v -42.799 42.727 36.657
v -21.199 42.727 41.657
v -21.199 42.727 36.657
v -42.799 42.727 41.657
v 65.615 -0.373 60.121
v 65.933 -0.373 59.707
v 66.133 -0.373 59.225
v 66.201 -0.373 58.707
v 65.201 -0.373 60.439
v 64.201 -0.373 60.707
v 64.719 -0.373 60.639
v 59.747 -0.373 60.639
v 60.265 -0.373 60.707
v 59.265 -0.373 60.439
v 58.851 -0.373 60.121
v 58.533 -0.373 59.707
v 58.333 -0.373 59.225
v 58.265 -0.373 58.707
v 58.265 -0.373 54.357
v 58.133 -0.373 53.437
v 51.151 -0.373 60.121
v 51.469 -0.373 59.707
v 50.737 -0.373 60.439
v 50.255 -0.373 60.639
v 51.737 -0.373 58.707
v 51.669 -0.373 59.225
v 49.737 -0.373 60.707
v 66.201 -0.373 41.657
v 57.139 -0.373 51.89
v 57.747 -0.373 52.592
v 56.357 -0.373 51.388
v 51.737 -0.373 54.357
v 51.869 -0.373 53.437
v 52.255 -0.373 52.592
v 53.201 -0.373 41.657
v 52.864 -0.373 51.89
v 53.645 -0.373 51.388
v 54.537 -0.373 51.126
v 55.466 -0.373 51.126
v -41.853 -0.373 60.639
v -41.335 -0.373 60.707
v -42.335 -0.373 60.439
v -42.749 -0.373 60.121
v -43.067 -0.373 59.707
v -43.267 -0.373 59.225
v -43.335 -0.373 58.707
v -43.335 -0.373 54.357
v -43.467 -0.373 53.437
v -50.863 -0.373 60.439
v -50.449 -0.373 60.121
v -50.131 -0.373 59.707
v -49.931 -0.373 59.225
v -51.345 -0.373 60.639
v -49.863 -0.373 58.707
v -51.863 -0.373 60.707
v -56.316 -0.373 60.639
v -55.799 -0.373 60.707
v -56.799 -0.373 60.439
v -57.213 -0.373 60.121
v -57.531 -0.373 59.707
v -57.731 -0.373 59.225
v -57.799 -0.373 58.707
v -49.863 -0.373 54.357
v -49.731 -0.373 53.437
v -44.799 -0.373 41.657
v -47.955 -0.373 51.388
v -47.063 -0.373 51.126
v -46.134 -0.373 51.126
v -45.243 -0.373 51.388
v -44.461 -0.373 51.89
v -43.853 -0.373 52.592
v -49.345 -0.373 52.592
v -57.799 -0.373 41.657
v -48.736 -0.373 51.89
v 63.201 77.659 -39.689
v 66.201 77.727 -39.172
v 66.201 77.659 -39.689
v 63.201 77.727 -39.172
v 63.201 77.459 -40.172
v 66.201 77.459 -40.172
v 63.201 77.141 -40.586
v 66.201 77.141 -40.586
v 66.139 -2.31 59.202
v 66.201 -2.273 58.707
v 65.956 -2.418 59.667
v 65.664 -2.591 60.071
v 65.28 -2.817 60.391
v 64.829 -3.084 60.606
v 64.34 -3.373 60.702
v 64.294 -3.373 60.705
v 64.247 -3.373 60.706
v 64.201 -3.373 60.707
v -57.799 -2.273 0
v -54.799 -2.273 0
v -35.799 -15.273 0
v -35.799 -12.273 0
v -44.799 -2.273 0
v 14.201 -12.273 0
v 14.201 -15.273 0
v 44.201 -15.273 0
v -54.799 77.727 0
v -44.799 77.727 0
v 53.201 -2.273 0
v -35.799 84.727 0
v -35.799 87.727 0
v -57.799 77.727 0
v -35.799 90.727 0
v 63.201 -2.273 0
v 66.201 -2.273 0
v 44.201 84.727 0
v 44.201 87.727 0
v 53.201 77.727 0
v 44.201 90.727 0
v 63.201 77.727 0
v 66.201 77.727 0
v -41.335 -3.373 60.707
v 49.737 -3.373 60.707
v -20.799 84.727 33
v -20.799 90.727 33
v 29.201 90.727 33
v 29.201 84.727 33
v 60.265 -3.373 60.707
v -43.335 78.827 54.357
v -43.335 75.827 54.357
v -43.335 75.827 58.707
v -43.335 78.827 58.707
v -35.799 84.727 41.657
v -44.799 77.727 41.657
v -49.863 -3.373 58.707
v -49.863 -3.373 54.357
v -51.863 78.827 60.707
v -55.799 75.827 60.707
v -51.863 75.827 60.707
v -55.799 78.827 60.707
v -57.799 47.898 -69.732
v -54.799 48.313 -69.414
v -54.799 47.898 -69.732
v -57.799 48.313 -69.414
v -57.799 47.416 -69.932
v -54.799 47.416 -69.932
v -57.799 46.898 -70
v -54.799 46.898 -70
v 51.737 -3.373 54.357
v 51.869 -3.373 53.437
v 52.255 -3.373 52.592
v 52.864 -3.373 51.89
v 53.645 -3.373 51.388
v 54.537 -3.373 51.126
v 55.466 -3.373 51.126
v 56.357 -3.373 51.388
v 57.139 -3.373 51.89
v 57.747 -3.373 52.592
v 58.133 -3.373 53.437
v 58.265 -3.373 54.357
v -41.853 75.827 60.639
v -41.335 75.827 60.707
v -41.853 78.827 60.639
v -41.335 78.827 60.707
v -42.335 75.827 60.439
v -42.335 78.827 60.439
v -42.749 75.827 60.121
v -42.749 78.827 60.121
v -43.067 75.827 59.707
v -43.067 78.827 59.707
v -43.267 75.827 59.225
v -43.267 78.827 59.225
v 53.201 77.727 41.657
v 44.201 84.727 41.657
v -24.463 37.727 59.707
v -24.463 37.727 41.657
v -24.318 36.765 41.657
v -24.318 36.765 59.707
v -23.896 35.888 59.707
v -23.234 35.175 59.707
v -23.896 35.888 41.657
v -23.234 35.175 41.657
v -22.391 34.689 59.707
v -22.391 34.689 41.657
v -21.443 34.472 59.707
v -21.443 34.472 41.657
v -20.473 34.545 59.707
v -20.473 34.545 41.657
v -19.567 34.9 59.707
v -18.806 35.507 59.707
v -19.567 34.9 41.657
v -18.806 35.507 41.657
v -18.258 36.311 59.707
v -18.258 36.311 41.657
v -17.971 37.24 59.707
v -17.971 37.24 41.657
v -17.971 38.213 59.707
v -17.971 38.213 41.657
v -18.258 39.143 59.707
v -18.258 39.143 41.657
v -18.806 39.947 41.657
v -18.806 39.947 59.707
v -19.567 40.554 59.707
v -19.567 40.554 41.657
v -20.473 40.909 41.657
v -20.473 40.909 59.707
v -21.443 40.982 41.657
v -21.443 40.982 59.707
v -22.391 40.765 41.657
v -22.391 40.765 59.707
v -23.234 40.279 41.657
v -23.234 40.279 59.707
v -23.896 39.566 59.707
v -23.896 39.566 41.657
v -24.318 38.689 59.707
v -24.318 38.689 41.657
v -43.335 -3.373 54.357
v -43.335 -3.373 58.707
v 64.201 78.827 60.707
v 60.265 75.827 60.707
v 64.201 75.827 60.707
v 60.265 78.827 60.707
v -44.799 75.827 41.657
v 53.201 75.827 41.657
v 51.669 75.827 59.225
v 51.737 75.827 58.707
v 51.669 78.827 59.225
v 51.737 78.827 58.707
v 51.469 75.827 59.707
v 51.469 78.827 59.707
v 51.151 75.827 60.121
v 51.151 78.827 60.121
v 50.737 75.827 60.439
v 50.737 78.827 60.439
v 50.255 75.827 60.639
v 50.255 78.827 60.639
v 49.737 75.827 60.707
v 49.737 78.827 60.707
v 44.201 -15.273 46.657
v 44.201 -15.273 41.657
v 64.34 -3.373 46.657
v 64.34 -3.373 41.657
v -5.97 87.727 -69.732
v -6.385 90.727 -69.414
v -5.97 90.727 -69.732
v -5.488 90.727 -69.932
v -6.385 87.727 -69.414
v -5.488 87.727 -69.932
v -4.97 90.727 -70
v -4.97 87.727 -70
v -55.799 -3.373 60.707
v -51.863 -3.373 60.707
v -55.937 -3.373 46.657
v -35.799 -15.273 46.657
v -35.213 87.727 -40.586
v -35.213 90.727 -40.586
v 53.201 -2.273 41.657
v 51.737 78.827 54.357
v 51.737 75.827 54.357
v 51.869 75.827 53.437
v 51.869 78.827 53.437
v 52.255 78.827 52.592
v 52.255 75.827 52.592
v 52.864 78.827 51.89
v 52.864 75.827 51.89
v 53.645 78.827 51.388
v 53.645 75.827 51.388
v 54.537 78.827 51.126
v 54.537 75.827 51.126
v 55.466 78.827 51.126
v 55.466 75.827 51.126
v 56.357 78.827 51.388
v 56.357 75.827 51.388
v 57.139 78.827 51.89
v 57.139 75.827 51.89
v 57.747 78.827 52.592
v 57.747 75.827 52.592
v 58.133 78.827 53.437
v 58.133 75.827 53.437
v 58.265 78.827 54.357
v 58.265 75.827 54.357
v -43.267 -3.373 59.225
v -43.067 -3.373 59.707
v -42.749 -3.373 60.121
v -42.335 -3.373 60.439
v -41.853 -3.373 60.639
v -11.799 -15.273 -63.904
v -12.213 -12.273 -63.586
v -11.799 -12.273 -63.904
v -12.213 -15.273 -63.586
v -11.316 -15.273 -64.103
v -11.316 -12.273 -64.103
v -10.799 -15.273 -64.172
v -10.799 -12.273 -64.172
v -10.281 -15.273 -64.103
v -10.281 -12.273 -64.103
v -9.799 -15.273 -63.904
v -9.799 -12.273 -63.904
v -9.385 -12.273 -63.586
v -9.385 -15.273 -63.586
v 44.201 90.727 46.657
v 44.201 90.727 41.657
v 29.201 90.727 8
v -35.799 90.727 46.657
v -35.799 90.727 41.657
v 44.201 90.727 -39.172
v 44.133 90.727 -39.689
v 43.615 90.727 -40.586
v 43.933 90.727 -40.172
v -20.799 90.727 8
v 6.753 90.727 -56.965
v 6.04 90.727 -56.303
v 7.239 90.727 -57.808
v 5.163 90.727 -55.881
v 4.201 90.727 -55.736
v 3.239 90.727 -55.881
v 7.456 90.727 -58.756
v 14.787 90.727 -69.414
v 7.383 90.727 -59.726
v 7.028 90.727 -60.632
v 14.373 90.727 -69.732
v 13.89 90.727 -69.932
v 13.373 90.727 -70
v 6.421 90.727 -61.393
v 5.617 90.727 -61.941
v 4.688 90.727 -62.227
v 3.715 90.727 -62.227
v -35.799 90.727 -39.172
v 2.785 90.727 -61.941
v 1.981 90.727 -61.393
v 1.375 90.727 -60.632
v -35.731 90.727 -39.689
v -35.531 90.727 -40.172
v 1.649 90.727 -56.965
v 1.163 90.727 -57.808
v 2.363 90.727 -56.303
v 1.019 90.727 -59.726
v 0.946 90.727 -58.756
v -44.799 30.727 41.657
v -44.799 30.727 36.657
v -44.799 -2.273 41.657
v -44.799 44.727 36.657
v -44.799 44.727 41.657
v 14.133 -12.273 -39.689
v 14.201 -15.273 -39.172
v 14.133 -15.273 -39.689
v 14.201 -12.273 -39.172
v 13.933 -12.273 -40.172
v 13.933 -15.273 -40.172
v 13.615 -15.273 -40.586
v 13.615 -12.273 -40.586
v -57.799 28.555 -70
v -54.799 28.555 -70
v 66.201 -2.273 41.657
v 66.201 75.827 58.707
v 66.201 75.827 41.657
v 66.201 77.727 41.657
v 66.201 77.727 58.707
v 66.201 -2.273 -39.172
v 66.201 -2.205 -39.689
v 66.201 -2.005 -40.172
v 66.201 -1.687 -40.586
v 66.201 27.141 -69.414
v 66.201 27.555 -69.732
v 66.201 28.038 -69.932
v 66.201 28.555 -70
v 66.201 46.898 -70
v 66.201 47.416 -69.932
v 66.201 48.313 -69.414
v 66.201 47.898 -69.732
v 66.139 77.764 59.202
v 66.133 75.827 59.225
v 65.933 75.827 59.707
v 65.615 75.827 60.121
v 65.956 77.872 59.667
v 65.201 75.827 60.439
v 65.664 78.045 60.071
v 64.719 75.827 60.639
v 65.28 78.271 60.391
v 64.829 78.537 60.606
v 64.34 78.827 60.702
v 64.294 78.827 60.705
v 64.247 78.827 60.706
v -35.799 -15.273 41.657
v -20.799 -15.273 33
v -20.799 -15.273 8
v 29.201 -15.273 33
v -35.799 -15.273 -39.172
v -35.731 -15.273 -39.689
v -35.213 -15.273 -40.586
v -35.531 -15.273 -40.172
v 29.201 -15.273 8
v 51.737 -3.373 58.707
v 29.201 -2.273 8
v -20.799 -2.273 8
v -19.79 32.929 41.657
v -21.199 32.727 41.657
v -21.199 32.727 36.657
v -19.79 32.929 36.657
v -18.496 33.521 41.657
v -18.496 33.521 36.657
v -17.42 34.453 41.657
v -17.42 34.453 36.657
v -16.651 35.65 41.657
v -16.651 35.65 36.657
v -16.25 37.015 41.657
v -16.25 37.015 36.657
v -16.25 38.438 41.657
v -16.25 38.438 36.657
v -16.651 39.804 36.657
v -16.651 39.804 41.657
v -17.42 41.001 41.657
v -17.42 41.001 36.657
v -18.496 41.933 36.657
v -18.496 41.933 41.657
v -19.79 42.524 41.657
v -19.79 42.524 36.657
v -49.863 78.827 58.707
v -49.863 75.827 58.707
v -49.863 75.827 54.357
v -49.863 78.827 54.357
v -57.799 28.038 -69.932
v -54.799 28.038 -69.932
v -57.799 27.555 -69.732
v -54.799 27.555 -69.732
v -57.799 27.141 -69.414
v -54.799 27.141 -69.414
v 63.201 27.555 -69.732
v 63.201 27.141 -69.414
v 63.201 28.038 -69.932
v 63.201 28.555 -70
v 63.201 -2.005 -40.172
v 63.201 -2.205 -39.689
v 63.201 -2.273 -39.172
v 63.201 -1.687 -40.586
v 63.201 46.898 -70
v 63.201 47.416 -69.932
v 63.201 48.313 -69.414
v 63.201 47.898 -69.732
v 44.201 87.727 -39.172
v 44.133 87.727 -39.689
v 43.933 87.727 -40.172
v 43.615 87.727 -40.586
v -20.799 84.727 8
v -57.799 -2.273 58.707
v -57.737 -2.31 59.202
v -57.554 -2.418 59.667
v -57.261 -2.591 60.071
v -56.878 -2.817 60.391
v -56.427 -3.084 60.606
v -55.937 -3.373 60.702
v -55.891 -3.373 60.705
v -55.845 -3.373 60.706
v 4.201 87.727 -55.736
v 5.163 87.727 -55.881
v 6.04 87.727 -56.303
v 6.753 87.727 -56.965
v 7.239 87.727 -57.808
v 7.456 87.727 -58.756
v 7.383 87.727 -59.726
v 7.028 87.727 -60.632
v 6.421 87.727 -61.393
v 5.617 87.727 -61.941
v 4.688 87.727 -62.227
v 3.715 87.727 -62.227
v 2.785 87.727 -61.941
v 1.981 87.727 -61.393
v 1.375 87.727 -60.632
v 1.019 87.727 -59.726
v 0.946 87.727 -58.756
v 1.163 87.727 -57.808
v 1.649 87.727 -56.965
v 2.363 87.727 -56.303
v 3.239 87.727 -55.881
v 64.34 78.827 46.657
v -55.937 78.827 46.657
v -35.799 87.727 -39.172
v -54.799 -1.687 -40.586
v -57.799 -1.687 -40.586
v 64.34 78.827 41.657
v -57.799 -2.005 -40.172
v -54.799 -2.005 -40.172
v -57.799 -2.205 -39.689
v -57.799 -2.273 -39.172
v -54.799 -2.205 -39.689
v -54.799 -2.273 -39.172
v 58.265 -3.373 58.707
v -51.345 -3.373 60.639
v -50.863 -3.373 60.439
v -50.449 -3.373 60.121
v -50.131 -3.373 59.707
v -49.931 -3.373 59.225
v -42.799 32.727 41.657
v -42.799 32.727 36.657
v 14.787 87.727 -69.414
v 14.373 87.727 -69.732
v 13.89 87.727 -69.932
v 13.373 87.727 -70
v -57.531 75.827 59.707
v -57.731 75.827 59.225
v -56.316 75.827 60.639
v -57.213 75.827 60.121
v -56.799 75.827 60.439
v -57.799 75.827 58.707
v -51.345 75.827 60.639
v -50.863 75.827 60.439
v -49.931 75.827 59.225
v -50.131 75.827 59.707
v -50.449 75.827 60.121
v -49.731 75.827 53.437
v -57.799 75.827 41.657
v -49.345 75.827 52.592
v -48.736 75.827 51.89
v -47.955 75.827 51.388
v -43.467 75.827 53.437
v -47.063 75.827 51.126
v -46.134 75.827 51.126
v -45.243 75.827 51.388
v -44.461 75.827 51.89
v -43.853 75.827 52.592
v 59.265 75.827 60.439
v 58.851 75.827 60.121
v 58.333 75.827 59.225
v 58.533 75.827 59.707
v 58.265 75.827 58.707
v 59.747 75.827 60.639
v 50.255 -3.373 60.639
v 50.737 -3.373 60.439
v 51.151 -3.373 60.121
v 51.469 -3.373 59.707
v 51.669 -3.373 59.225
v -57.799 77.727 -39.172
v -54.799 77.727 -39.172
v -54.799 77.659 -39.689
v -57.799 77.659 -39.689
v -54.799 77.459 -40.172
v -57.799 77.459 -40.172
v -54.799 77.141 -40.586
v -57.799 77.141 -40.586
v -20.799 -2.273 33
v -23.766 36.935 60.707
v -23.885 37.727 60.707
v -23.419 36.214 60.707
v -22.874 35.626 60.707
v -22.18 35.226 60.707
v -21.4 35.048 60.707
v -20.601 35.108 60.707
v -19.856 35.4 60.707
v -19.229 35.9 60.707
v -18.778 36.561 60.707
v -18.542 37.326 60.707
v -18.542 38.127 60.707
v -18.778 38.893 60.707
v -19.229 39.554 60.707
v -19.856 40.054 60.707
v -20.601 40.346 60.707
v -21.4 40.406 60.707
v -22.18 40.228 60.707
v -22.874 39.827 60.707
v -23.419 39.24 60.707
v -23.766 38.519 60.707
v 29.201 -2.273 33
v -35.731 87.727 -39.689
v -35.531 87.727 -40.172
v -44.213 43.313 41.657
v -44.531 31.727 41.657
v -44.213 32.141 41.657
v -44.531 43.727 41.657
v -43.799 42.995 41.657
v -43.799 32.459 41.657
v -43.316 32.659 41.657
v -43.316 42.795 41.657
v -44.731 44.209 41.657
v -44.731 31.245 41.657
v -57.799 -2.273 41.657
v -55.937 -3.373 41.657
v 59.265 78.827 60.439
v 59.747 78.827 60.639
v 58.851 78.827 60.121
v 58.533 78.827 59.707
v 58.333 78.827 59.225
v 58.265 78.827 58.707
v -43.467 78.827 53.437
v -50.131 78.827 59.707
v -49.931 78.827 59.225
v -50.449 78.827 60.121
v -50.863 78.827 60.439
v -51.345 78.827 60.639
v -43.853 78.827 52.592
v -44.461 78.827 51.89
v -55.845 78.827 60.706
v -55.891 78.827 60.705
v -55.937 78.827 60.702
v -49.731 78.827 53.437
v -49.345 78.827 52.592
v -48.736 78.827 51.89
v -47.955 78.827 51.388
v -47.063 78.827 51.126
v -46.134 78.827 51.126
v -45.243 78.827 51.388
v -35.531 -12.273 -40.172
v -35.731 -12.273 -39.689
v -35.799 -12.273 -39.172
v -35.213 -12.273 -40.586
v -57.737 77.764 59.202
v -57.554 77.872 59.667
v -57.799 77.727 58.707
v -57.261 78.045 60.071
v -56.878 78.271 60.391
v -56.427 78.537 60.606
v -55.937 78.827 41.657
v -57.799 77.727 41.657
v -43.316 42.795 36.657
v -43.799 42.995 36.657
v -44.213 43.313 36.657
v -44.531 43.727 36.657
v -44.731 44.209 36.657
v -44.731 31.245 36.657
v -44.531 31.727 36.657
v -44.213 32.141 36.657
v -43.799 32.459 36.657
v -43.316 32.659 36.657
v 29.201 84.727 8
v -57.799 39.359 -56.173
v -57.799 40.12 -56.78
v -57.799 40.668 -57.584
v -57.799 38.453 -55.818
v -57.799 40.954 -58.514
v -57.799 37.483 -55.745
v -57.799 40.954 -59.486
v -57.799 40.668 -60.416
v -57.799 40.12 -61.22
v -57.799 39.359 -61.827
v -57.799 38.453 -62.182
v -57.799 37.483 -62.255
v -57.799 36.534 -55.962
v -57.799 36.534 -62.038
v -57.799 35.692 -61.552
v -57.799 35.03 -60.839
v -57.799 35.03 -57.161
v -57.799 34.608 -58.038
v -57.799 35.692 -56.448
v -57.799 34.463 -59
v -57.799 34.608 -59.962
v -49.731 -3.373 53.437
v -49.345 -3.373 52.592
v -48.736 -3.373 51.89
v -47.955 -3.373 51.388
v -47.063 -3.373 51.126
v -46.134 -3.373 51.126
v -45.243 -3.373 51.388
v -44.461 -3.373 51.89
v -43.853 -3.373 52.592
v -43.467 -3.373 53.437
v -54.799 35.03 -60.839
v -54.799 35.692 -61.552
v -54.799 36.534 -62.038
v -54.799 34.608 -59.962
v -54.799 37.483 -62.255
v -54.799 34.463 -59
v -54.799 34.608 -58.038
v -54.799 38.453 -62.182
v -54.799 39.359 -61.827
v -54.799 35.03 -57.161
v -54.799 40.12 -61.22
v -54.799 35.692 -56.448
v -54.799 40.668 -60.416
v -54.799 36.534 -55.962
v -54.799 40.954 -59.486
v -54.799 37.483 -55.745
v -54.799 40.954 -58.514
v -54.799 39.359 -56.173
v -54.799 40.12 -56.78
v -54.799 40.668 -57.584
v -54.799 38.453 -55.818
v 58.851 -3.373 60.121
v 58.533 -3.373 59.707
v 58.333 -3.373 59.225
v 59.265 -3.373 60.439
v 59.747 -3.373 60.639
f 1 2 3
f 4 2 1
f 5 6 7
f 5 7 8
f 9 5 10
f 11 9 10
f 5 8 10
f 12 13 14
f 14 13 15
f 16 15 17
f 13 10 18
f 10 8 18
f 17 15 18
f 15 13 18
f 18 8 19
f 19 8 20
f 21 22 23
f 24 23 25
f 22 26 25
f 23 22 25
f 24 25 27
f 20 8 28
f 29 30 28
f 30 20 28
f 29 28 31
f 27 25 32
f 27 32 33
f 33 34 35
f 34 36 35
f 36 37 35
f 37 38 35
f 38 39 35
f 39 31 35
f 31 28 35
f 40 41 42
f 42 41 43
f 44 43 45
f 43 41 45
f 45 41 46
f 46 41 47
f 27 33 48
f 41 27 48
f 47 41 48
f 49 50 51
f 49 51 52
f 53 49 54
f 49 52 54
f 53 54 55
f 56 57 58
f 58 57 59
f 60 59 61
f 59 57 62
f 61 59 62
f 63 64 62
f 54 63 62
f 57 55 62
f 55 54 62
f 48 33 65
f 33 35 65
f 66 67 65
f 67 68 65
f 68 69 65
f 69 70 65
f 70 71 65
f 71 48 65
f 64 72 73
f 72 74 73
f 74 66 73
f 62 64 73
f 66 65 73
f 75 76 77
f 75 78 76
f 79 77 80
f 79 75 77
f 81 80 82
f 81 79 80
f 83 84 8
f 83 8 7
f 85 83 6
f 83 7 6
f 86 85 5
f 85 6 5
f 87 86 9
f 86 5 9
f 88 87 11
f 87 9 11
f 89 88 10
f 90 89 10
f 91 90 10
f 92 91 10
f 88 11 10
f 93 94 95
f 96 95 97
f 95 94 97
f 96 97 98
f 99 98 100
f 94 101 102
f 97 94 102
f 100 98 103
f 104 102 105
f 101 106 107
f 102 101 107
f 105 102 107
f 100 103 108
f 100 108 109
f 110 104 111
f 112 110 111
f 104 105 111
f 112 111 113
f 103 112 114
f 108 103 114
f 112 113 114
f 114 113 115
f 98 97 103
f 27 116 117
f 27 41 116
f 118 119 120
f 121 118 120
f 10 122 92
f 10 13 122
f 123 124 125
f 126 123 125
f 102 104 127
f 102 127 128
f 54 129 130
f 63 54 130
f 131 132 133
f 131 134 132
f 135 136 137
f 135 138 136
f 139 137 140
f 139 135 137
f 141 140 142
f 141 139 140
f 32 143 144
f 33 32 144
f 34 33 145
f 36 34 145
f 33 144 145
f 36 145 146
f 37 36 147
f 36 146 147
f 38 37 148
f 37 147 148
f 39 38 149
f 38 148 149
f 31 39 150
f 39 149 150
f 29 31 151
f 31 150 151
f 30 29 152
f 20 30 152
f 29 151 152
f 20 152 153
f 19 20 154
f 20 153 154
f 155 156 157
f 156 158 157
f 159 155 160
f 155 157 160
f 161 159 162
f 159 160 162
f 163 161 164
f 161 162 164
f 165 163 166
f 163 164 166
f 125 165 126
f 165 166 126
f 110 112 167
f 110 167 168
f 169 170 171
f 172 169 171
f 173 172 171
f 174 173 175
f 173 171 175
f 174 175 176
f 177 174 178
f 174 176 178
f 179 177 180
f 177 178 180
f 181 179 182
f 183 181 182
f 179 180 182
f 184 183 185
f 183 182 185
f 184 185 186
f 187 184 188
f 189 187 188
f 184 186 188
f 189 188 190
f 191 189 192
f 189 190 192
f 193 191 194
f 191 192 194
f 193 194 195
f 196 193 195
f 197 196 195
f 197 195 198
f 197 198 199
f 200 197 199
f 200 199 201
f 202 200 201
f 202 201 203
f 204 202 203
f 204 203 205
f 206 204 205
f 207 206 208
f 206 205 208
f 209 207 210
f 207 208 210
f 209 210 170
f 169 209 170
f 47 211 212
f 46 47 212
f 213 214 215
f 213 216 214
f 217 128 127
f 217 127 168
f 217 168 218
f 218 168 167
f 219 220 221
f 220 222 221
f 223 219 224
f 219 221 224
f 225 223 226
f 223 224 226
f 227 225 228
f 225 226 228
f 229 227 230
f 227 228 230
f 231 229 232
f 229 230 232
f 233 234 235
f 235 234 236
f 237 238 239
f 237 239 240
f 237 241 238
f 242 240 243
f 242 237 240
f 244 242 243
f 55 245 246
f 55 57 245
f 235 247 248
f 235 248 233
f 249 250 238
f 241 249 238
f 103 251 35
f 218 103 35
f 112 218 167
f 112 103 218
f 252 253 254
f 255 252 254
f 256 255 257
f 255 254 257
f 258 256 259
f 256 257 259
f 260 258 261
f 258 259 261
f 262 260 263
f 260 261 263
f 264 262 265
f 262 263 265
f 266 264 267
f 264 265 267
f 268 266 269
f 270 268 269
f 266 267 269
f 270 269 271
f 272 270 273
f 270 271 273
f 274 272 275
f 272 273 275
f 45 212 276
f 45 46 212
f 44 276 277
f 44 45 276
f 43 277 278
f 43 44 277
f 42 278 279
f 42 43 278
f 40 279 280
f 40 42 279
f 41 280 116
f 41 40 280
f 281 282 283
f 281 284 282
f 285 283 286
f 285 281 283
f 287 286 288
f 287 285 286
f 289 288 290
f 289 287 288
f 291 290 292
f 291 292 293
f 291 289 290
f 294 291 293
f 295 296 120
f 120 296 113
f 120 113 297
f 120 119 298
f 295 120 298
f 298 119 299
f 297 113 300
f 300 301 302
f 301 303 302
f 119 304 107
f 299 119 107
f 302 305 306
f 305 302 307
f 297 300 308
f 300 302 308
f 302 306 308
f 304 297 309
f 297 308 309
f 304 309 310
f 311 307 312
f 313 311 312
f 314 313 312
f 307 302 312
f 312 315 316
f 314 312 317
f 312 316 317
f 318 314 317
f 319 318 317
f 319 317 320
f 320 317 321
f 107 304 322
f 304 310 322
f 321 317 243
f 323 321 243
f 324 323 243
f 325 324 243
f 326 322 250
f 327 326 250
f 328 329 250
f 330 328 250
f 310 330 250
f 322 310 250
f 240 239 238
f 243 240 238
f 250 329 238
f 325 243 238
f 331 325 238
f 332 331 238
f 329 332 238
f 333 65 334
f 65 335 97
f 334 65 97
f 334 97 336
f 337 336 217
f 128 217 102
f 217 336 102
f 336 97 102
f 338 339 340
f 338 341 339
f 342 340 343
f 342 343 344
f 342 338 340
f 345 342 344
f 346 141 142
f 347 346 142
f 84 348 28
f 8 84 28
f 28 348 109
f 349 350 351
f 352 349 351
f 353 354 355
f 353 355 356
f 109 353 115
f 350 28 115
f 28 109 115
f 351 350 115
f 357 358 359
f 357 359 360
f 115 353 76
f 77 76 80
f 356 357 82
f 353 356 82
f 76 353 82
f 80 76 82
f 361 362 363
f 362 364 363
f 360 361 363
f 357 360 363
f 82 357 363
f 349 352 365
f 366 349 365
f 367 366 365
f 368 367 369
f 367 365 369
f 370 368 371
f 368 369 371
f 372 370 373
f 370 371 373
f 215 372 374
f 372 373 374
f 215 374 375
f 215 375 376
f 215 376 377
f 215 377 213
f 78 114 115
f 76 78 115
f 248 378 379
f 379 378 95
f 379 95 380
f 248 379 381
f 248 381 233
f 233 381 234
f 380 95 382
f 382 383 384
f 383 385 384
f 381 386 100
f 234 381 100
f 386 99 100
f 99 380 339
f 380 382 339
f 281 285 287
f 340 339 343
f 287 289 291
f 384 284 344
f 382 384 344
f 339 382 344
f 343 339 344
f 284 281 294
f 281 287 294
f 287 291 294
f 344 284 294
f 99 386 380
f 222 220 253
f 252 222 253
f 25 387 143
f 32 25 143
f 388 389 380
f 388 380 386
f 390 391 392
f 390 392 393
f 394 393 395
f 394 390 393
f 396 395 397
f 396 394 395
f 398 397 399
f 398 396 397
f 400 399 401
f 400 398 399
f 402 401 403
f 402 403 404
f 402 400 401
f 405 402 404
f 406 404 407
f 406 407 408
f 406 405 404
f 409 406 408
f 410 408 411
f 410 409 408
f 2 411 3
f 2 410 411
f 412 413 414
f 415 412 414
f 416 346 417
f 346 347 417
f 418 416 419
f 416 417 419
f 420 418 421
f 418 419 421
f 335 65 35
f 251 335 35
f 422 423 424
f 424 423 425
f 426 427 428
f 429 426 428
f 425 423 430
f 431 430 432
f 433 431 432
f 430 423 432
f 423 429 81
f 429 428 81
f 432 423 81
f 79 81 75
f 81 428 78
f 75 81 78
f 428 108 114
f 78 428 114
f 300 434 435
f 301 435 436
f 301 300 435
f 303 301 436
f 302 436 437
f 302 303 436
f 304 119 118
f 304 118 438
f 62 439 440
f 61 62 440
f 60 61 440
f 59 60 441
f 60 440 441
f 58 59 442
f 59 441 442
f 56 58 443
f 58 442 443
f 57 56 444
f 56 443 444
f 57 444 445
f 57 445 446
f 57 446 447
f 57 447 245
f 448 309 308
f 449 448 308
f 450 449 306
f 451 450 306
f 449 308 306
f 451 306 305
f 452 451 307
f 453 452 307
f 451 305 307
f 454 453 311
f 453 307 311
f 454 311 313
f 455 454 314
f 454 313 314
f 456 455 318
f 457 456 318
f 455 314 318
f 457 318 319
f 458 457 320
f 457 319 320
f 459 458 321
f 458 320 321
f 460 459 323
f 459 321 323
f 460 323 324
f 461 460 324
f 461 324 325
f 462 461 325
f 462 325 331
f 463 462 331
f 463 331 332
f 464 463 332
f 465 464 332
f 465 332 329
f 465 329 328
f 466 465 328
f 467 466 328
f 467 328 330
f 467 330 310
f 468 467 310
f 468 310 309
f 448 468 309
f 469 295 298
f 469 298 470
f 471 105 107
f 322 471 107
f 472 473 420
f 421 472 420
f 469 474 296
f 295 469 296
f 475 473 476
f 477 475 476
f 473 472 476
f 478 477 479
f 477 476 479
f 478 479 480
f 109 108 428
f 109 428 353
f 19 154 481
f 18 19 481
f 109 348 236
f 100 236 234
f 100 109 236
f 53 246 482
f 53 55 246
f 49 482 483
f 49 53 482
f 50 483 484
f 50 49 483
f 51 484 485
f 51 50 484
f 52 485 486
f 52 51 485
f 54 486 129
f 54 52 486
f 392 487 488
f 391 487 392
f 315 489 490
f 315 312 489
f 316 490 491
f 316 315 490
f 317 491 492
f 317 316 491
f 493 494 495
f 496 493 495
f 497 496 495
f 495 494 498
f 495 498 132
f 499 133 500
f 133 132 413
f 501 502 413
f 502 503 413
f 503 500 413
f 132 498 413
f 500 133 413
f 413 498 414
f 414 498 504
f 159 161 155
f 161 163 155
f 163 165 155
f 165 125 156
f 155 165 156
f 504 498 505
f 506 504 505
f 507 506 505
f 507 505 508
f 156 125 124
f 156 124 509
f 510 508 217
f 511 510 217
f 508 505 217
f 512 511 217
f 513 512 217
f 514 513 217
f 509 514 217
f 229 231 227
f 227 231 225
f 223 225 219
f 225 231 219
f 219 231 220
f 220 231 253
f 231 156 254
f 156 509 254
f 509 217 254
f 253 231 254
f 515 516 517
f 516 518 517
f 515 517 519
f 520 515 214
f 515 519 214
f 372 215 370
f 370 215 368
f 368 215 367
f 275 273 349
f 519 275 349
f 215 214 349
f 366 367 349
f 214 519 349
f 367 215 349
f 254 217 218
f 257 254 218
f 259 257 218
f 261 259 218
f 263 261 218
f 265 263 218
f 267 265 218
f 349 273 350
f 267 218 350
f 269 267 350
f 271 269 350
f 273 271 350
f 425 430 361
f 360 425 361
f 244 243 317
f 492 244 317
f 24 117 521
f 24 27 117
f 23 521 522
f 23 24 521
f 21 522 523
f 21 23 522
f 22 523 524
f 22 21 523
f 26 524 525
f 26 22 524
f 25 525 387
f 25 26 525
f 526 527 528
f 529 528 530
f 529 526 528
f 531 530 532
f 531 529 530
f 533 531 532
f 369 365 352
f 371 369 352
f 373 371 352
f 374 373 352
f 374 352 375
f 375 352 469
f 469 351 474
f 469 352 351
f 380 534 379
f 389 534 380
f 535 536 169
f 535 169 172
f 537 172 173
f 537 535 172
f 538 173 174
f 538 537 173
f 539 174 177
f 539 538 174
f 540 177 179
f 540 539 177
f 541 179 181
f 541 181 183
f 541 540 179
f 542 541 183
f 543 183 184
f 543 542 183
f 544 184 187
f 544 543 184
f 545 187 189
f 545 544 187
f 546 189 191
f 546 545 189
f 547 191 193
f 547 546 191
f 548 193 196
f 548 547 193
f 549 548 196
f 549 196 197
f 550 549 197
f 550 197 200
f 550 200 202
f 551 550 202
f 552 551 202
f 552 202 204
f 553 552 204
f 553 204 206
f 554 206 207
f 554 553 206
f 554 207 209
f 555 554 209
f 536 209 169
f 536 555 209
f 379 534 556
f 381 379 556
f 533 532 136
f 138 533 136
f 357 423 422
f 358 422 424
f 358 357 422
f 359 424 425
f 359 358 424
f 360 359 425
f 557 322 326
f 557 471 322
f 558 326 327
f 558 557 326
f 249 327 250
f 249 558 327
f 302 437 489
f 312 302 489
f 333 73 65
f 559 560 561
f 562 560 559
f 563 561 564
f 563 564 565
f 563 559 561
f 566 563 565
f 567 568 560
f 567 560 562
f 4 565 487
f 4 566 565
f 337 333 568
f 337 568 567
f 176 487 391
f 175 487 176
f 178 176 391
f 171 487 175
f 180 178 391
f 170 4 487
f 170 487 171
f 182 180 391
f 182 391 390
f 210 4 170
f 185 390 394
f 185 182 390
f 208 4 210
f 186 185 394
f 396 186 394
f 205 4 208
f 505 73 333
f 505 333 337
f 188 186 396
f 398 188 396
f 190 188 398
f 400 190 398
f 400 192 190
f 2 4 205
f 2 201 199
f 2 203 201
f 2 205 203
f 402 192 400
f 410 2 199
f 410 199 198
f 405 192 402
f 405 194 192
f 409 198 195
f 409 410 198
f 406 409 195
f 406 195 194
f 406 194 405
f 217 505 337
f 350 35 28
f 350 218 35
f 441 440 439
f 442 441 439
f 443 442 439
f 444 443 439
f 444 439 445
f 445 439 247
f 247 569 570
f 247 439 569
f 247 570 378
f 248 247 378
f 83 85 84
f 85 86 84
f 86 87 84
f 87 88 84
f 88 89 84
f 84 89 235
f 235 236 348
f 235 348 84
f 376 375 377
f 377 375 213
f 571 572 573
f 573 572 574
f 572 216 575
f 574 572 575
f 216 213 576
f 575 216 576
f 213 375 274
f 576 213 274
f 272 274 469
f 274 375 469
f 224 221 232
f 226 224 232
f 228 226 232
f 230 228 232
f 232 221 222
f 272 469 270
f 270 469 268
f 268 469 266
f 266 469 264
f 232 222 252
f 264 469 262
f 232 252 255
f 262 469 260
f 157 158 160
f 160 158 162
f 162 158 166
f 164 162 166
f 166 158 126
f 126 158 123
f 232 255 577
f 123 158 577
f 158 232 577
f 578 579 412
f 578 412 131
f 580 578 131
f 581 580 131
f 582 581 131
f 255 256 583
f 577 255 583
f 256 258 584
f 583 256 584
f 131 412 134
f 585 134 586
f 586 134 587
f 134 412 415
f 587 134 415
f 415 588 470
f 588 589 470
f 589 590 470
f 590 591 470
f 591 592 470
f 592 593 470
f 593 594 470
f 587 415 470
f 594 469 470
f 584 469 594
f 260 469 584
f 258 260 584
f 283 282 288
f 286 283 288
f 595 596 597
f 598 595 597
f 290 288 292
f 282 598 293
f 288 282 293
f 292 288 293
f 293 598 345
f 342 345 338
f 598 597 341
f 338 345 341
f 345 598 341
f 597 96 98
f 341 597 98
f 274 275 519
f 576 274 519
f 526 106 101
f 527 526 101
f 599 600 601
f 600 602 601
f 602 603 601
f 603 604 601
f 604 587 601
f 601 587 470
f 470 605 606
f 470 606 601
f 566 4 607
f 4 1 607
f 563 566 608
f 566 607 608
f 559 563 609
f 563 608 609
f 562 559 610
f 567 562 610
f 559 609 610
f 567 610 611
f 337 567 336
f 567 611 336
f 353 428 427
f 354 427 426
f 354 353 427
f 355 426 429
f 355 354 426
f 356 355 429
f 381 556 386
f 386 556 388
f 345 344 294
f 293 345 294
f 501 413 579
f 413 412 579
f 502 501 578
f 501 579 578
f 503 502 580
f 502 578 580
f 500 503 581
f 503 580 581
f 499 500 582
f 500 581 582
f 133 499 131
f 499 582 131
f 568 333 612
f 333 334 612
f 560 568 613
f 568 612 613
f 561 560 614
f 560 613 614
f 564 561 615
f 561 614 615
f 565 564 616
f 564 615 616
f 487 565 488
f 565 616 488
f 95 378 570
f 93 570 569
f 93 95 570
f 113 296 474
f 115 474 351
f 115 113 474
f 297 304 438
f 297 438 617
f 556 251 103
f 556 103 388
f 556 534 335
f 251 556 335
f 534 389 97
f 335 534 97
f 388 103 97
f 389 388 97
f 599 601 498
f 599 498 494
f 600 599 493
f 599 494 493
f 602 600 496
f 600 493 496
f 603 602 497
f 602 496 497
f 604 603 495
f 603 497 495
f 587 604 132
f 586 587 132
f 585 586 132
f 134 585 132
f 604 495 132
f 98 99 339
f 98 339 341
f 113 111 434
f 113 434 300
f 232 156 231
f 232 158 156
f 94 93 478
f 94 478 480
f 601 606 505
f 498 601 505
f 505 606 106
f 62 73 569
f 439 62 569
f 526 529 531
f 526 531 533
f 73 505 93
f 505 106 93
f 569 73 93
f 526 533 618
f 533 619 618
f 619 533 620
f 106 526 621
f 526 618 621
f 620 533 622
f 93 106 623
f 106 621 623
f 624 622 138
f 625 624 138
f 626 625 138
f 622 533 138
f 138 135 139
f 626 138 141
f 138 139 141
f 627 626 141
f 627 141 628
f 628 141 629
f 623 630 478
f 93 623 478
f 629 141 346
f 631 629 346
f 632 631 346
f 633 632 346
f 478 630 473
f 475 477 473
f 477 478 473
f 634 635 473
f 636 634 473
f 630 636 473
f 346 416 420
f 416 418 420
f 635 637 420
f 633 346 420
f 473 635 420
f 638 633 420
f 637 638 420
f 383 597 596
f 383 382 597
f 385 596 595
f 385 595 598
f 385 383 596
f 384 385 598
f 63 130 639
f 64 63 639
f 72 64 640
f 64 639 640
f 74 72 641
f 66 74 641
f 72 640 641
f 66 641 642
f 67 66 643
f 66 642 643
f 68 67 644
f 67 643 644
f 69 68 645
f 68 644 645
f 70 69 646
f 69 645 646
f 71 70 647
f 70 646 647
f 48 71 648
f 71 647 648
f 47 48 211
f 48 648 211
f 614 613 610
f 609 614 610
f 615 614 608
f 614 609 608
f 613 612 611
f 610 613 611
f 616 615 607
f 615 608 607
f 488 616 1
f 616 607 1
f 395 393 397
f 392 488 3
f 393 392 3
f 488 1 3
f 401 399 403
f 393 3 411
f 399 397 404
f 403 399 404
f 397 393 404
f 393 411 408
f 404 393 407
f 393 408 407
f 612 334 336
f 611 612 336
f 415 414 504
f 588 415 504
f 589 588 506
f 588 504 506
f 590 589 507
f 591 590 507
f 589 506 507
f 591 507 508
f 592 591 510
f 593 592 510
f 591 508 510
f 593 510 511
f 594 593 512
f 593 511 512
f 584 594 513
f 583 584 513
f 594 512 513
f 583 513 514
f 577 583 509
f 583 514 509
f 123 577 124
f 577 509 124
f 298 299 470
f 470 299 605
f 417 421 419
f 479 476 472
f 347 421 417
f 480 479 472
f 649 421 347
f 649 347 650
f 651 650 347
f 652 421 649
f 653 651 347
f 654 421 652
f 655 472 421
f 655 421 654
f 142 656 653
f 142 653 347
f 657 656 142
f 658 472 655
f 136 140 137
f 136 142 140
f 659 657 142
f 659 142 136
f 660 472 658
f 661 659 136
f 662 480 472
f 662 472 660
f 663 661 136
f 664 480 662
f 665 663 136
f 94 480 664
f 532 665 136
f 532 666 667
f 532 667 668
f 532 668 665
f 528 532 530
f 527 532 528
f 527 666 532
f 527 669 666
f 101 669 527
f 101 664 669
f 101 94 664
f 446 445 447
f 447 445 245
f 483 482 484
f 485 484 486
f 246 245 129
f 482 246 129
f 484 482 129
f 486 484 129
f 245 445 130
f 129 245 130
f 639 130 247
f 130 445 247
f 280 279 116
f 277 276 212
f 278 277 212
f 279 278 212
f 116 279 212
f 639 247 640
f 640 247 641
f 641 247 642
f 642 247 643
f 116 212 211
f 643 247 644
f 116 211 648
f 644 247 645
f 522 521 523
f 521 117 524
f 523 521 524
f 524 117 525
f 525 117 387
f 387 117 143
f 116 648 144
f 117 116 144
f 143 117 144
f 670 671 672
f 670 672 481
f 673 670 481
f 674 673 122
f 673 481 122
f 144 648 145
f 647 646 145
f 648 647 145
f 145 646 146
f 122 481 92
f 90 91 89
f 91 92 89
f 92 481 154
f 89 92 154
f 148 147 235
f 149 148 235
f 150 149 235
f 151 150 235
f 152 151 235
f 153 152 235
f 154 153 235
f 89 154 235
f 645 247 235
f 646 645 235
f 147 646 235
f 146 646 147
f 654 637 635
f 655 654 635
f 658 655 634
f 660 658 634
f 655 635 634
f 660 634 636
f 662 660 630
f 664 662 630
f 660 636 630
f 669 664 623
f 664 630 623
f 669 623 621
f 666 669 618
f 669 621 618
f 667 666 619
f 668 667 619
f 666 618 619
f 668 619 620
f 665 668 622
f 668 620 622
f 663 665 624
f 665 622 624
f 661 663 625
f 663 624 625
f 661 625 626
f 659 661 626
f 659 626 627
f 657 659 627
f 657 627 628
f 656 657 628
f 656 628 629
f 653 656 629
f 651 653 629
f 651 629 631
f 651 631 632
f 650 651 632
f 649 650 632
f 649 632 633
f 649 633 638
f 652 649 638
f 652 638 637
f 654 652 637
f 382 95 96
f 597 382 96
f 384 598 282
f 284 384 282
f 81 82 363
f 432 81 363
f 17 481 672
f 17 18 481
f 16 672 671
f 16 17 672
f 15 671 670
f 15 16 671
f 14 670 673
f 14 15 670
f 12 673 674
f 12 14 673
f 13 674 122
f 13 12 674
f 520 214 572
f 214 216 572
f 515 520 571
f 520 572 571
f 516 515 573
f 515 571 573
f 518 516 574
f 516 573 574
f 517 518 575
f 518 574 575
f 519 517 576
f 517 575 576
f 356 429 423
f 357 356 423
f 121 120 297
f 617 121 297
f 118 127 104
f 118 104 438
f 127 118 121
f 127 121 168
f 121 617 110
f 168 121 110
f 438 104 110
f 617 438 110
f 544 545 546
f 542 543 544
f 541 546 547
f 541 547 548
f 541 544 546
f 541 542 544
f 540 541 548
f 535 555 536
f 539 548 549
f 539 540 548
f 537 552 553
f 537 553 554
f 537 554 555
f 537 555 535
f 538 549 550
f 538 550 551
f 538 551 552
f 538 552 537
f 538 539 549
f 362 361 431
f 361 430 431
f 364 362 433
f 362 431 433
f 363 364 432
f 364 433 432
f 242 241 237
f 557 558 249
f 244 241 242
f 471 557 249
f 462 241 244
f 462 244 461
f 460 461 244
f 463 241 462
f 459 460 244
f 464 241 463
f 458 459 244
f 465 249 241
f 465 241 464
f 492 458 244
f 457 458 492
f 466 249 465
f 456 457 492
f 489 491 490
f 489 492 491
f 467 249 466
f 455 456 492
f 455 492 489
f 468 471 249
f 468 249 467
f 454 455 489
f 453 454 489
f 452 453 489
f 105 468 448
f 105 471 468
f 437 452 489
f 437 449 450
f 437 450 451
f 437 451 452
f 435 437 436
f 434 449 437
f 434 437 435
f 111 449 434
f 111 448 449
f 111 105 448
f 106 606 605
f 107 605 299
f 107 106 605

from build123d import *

# Parameters (mm, degrees)
SKETCH1_W           = 10
SKETCH1_H           = 80
SKETCH1_W_2         = 3
SKETCH1_W_3         = 80
SKETCH1_H_2         = 3
SKETCH1_H_3         = 10
SKETCH1_W_4         = 30
BOSS_EXTRUDE1_DEPTH = 41.657
SKETCH1_6_W         = 3
SKETCH1_6_H         = 80
SKETCH1_6_W_2       = 80
SKETCH1_6_H_2       = 3
SKETCH1_6_W_3       = 50
BOSS_EXTRUDE2_DEPTH = 70
CUT_EXTRUDE1_REACH  = 170.841
SKETCH2_R           = 3.2639
CUT_EXTRUDE2_REACH  = 145.243
SKETCH3_R           = 3.2639
SKETCH4_W           = 98
SKETCH4_H           = 1.9
BOSS_EXTRUDE3_DEPTH = 5
SKETCH4_4_W         = 98
SKETCH4_4_H         = 1.9
BOSS_EXTRUDE4_DEPTH = 19.05
CUT_EXTRUDE3_DEPTH  = 135.675178822
SKETCH6_R           = 3.2639
BOSS_EXTRUDE5_DEPTH = 5
SKETCH6_3_R         = 3.2639
BOSS_EXTRUDE6_DEPTH = 19.05
SKETCH7_W           = 50
SKETCH7_H           = 25
CUT_EXTRUDE4_DEPTH  = 144.24312825
CHAMFER1_SIZE       = 30
CHAMFER2_SIZE       = 1
CHAMFER2_SIZE2      = 0.577350269
FILLET1_R           = 2


with BuildPart() as part:
    # Sketch1 → Boss-Extrude1 (new body)
    with BuildSketch(Plane.XY):
        with Locations((-49.798838448, 37.726897406)):
            Rectangle(SKETCH1_W, SKETCH1_H)
        with Locations((-56.298838448, 37.726897406)):
            Rectangle(SKETCH1_W_2, SKETCH1_H)
        Polygon((-35.798838448, 87.726897406), (-35.798838448, 84.726897406), (-44.798838448, 77.726897406), (-54.798838448, 77.726897406), (-57.798838448, 77.726897406), (-35.798838448, 90.726897406), align=None)
        with Locations((4.201161552, 86.226897406)):
            Rectangle(SKETCH1_W_3, SKETCH1_H_2)
        with Locations((4.201161552, 89.226897406)):
            Rectangle(SKETCH1_W_3, SKETCH1_H_2)
        Polygon((44.201161552, 87.726897406), (44.201161552, 90.726897406), (66.201161552, 77.726897406), (63.201161552, 77.726897406), (53.201161552, 77.726897406), (44.201161552, 84.726897406), align=None)
        with Locations((58.201161552, 37.726897406)):
            Rectangle(SKETCH1_W, SKETCH1_H)
        with Locations((64.701161552, 37.726897406)):
            Rectangle(SKETCH1_W_2, SKETCH1_H)
        with Locations((4.201161552, -7.273102594)):
            Rectangle(SKETCH1_W_3, SKETCH1_H_3)
        Polygon((66.201161552, -2.273102594), (44.201161552, -15.273102594), (44.201161552, -12.273102594), (44.201161552, -2.273102594), (53.201161552, -2.273102594), (63.201161552, -2.273102594), align=None)
        Polygon((-35.798838448, -15.273102594), (-57.798838448, -2.273102594), (-54.798838448, -2.273102594), (-44.798838448, -2.273102594), (-35.798838448, -2.273102594), (-35.798838448, -12.273102594), align=None)
        with Locations((4.201161552, -13.773102594)):
            Rectangle(SKETCH1_W_3, SKETCH1_H_2)
        with Locations((29.201161552, -13.773102594)):
            Rectangle(SKETCH1_W_4, SKETCH1_H_2)
    extrude(amount=BOSS_EXTRUDE1_DEPTH)

    # Sketch1<6> → Boss-Extrude2 (add)
    with BuildSketch(Plane.XY):
        with Locations((-56.298838448, 37.726897406)):
            Rectangle(SKETCH1_6_W, SKETCH1_6_H)
        with Locations((4.201161552, 89.226897406)):
            Rectangle(SKETCH1_6_W_2, SKETCH1_6_H_2)
        with Locations((-10.798838448, -13.773102594)):
            Rectangle(SKETCH1_6_W_3, SKETCH1_6_H_2)
        with Locations((64.701161552, 37.726897406)):
            Rectangle(SKETCH1_6_W, SKETCH1_6_H)
    extrude(amount=-BOSS_EXTRUDE2_DEPTH)

    # Sketch2 → Cut-Extrude1 (cut, up to next)
    with BuildSketch(Plane.ZY.offset(57.798838448), mode=Mode.PRIVATE) as cut_extrude1_sk1:
        with Locations(Location((-59, 37.726897406, 0), (0, 0, 270))):
            Circle(SKETCH2_R)
    cut_extrude1_tool1 = extrude(cut_extrude1_sk1.sketch, amount=-CUT_EXTRUDE1_REACH, mode=Mode.PRIVATE) & part.part
    add(cut_extrude1_tool1.solids().sort_by_distance((-57.798838, 37.726897, -59))[0], mode=Mode.SUBTRACT)

    # Sketch3 → Cut-Extrude2 (cut, up to next)
    with BuildSketch(Plane(origin=(0, 90.726897406, 0), x_dir=(1, 0, 0), z_dir=(0, 1, 0)), mode=Mode.PRIVATE) as cut_extrude2_sk1:
        with Locations(Location((4.201161552, 59, 0), (0, 0, 270))):
            Circle(SKETCH3_R)
    cut_extrude2_tool1 = extrude(cut_extrude2_sk1.sketch, amount=-CUT_EXTRUDE2_REACH, mode=Mode.PRIVATE) & part.part
    add(cut_extrude2_tool1.solids().sort_by_distance((4.201162, 90.726897, -59))[0], mode=Mode.SUBTRACT)

    # Sketch4 → Boss-Extrude3 (add)
    with BuildSketch(Plane.XY.offset(41.657)):
        Polygon((51.786875838, 78.826897406), (64.33962309, 78.826897406), (44.201161552, 90.726897406), (-35.798838448, 90.726897406), (-55.937299987, 78.826897406), (-43.384552734, 78.826897406), (-35.798838448, 84.726897406), (44.201161552, 84.726897406), align=None)
        Polygon((-43.384552734, 78.826897406), (51.786875838, 78.826897406), (44.201161552, 84.726897406), (-35.798838448, 84.726897406), align=None)
        Polygon((53.201161552, 75.826897406), (66.201161552, 75.826897406), (66.201161552, 77.726897406), (64.33962309, 78.826897406), (51.786875838, 78.826897406), (53.201161552, 77.726897406), align=None)
        Polygon((-44.798838448, 75.826897406), (53.201161552, 75.826897406), (53.201161552, 77.726897406), (51.786875838, 78.826897406), (-43.384552734, 78.826897406), (-44.798838448, 77.726897406), align=None)
        Polygon((66.201161552, -2.273102594), (66.201161552, -0.373102594), (53.201161552, -0.373102594), (53.201161552, -2.273102594), (-44.798838448, -2.273102594), (-44.798838448, -0.373102594), (-57.798838448, -0.373102594), (-57.798838448, -2.273102594), (-55.937299987, -3.373102594), (64.33962309, -3.373102594), align=None)
        with Locations((4.201161552, -1.323102594)):
            Rectangle(SKETCH4_W, SKETCH4_H)
        Polygon((44.201161552, -15.273102594), (64.33962309, -3.373102594), (-55.937299987, -3.373102594), (-35.798838448, -15.273102594), align=None)
        Polygon((-57.798838448, 75.826897406), (-44.798838448, 75.826897406), (-44.798838448, 77.726897406), (-43.384552734, 78.826897406), (-55.937299987, 78.826897406), (-57.798838448, 77.726897406), align=None)
    extrude(amount=BOSS_EXTRUDE3_DEPTH)

    # Sketch4<4> → Boss-Extrude4 (add)
    with BuildSketch(Plane.XY.offset(41.657)):
        Polygon((53.201161552, 75.826897406), (66.201161552, 75.826897406), (66.201161552, 77.726897406), (64.33962309, 78.826897406), (51.786875838, 78.826897406), (53.201161552, 77.726897406), align=None)
        Polygon((-44.798838448, 75.826897406), (53.201161552, 75.826897406), (53.201161552, 77.726897406), (51.786875838, 78.826897406), (-43.384552734, 78.826897406), (-44.798838448, 77.726897406), align=None)
        Polygon((66.201161552, -2.273102594), (66.201161552, -0.373102594), (53.201161552, -0.373102594), (53.201161552, -2.273102594), (-44.798838448, -2.273102594), (-44.798838448, -0.373102594), (-57.798838448, -0.373102594), (-57.798838448, -2.273102594), (-55.937299987, -3.373102594), (64.33962309, -3.373102594), align=None)
        with Locations((4.201161552, -1.323102594)):
            Rectangle(SKETCH4_4_W, SKETCH4_4_H)
        Polygon((-57.798838448, 75.826897406), (-44.798838448, 75.826897406), (-44.798838448, 77.726897406), (-43.384552734, 78.826897406), (-55.937299987, 78.826897406), (-57.798838448, 77.726897406), align=None)
    extrude(amount=BOSS_EXTRUDE4_DEPTH)

    # Sketch5 → Cut-Extrude3 (cut, through all)
    with BuildSketch(Plane.XZ.offset(3.373102594)):
        with BuildLine():
            Line((-49.862738448, 60.707), (-49.862738448, 54.357))
            ThreePointArc((-49.862738448, 54.357), (-46.598838448, 51.0931), (-43.334938448, 54.357))
            Line((-43.334938448, 54.357), (-43.334938448, 60.707))
            Line((-43.334938448, 60.707), (-49.862738448, 60.707))
        make_face()
        with BuildLine():
            Line((51.737261552, 60.707), (51.737261552, 54.357))
            ThreePointArc((51.737261552, 54.357), (55.001161552, 51.0931), (58.265061552, 54.357))
            Line((58.265061552, 54.357), (58.265061552, 60.707))
            Line((58.265061552, 60.707), (51.737261552, 60.707))
        make_face()
    extrude(amount=-CUT_EXTRUDE3_DEPTH, mode=Mode.SUBTRACT)

    # Sketch6 → Boss-Extrude5 (add)
    # profile 1 of 2: a face of its own
    with BuildSketch(Plane.XY.offset(41.657)):
        with BuildLine():
            Line((-44.798838448, 42.726897406), (-44.798838448, 37.726897406))
            Line((-44.798838448, 37.726897406), (-44.798838448, 32.726897406))
            Line((-44.798838448, 32.726897406), (-21.198838448, 32.726897406))
            ThreePointArc((-21.198838448, 32.726897406), (-16.198838448, 37.726897406), (-21.198838448, 42.726897406))
            Line((-21.198838448, 42.726897406), (-44.798838448, 42.726897406))
        make_face()
        with Locations((-21.198838448, 37.726897406)):
            Circle(SKETCH6_R, mode=Mode.SUBTRACT)
    # profile 2 of 2: a face of its own
    with BuildSketch(Plane.XY.offset(41.657)):
        with Locations((-21.198838448, 37.726897406)):
            Circle(SKETCH6_R)
    extrude(amount=-BOSS_EXTRUDE5_DEPTH)

    # Sketch6<3> → Boss-Extrude6 (add)
    with BuildSketch(Plane.XY.offset(41.657)):
        with Locations(Location((-21.198838448, 37.726897406, 0), (0, 0, 180))):
            Circle(SKETCH6_3_R)
    extrude(amount=BOSS_EXTRUDE6_DEPTH)

    # Sketch7 → Cut-Extrude4 (cut, through all)
    with BuildSketch(Plane(origin=(0, 90.726897406, 0), x_dir=(1, 0, 0), z_dir=(0, 1, 0))):
        with Locations((4.201161552, -20.5)):
            Rectangle(SKETCH7_W, SKETCH7_H)
    extrude(amount=-CUT_EXTRUDE4_DEPTH, mode=Mode.SUBTRACT)

    # Chamfer1
    # the kernel refuses this chamfer: 30 mm, written as the material it takes off along each edge
    with BuildSketch(Plane(origin=(22.351651191, 77.726897406, -70), x_dir=(0, 0.02749587661058632, 0.9996219169112968), z_dir=(-1, 0, 0)), Plane(origin=(-134.949328087, -2.273102594, -70), x_dir=(0, -0.02749587661058638, 0.9996219169112968), z_dir=(1, 0, 0)), Plane(origin=(-35.798838448, 64.877387045, -70), x_dir=(-0.02749587661058632, 0, 0.9996219169112968), z_dir=(0, -1, 0)), Plane(origin=(14.201161552, -92.423592233, -70), x_dir=(0.02749587661058638, 0, 0.9996219169112968), z_dir=(0, 1, 0)), Plane(origin=(-13.949328087, -2.273102594, -70), x_dir=(0, -0.02749587661058636, 0.9996219169112968), z_dir=(1, 0, 0)), Plane(origin=(143.351651191, 77.726897406, -70), x_dir=(0, 0.02749587661058632, 0.9996219169112968), z_dir=(-1, 0, 0)), Plane(origin=(44.201161552, 10.576407767, -70), x_dir=(0.02749587661058632, 0, 0.9996219169112968), z_dir=(0, 1, 0)), Plane(origin=(-35.798838448, 167.877387045, -70), x_dir=(-0.02749587661058632, 0, 0.9996219169112968), z_dir=(0, -1, 0))) as chamfer1_piece_1:
        Polygon((CHAMFER1_SIZE * 0.999621916911, -CHAMFER1_SIZE * 0.0274958766106), (-CHAMFER1_SIZE * 0.0274958766106, -CHAMFER1_SIZE * 0.999621916911), (0, 0), align=None)
    extrude(amount=157.300979278, mode=Mode.SUBTRACT)

    # Chamfer2
    chamfer2_edges = [part.edges().sort_by_distance(p)[0] for p in [
        (-17.934938448, 37.726897406, 60.707),
    ]]
    chamfer2_side = [part.faces().sort_by_distance(p)[0] for p in [
        (-17.934938448, 37.726897406, 51.182),
    ]]
    chamfer(chamfer2_edges, length=CHAMFER2_SIZE, length2=CHAMFER2_SIZE2, reference=chamfer2_side[0])

    # Fillet1
    fillet1_edges = [part.edges().sort_by_distance(p)[0] for p in [
        (66.201161552, -1.323102594, 60.707),
        (-57.798838448, -1.323102594, 60.707),
        (-57.798838448, 76.776897406, 60.707),
        (66.201161552, 76.776897406, 60.707),
        (58.265061552, 77.326897406, 60.707),
        (51.737261552, 77.326897406, 60.707),
        (-43.334938448, 77.326897406, 60.707),
        (-49.862738448, 77.326897406, 60.707),
        (-49.862738448, -1.873102594, 60.707),
        (-43.334938448, -1.873102594, 60.707),
        (51.737261552, -1.873102594, 60.707),
        (58.265061552, -1.873102594, 60.707),
        (-44.798838448, 32.726897406, 39.157),
        (-44.798838448, 42.726897406, 39.157),
        (14.201161552, 89.226897406, -70),
        (-5.798838448, 89.226897406, -70),
        (-35.798838448, 89.226897406, -40),
        (-56.298838448, 77.726897406, -40),
        (-56.298838448, 27.726897406, -70),
        (-56.298838448, 47.726897406, -70),
        (-56.298838448, -2.273102594, -40),
        (-35.798838448, -13.773102594, -40),
        (14.201161552, -13.773102594, -40),
        (64.701161552, -2.273102594, -40),
        (64.701161552, 47.726897406, -70),
        (64.701161552, 27.726897406, -70),
        (64.701161552, 77.726897406, -40),
        (44.201161552, 89.226897406, -40),
        (-10.798838448, -13.773102594, -65),
    ]]
    fillet(fillet1_edges, radius=FILLET1_R)


solid = part.part
